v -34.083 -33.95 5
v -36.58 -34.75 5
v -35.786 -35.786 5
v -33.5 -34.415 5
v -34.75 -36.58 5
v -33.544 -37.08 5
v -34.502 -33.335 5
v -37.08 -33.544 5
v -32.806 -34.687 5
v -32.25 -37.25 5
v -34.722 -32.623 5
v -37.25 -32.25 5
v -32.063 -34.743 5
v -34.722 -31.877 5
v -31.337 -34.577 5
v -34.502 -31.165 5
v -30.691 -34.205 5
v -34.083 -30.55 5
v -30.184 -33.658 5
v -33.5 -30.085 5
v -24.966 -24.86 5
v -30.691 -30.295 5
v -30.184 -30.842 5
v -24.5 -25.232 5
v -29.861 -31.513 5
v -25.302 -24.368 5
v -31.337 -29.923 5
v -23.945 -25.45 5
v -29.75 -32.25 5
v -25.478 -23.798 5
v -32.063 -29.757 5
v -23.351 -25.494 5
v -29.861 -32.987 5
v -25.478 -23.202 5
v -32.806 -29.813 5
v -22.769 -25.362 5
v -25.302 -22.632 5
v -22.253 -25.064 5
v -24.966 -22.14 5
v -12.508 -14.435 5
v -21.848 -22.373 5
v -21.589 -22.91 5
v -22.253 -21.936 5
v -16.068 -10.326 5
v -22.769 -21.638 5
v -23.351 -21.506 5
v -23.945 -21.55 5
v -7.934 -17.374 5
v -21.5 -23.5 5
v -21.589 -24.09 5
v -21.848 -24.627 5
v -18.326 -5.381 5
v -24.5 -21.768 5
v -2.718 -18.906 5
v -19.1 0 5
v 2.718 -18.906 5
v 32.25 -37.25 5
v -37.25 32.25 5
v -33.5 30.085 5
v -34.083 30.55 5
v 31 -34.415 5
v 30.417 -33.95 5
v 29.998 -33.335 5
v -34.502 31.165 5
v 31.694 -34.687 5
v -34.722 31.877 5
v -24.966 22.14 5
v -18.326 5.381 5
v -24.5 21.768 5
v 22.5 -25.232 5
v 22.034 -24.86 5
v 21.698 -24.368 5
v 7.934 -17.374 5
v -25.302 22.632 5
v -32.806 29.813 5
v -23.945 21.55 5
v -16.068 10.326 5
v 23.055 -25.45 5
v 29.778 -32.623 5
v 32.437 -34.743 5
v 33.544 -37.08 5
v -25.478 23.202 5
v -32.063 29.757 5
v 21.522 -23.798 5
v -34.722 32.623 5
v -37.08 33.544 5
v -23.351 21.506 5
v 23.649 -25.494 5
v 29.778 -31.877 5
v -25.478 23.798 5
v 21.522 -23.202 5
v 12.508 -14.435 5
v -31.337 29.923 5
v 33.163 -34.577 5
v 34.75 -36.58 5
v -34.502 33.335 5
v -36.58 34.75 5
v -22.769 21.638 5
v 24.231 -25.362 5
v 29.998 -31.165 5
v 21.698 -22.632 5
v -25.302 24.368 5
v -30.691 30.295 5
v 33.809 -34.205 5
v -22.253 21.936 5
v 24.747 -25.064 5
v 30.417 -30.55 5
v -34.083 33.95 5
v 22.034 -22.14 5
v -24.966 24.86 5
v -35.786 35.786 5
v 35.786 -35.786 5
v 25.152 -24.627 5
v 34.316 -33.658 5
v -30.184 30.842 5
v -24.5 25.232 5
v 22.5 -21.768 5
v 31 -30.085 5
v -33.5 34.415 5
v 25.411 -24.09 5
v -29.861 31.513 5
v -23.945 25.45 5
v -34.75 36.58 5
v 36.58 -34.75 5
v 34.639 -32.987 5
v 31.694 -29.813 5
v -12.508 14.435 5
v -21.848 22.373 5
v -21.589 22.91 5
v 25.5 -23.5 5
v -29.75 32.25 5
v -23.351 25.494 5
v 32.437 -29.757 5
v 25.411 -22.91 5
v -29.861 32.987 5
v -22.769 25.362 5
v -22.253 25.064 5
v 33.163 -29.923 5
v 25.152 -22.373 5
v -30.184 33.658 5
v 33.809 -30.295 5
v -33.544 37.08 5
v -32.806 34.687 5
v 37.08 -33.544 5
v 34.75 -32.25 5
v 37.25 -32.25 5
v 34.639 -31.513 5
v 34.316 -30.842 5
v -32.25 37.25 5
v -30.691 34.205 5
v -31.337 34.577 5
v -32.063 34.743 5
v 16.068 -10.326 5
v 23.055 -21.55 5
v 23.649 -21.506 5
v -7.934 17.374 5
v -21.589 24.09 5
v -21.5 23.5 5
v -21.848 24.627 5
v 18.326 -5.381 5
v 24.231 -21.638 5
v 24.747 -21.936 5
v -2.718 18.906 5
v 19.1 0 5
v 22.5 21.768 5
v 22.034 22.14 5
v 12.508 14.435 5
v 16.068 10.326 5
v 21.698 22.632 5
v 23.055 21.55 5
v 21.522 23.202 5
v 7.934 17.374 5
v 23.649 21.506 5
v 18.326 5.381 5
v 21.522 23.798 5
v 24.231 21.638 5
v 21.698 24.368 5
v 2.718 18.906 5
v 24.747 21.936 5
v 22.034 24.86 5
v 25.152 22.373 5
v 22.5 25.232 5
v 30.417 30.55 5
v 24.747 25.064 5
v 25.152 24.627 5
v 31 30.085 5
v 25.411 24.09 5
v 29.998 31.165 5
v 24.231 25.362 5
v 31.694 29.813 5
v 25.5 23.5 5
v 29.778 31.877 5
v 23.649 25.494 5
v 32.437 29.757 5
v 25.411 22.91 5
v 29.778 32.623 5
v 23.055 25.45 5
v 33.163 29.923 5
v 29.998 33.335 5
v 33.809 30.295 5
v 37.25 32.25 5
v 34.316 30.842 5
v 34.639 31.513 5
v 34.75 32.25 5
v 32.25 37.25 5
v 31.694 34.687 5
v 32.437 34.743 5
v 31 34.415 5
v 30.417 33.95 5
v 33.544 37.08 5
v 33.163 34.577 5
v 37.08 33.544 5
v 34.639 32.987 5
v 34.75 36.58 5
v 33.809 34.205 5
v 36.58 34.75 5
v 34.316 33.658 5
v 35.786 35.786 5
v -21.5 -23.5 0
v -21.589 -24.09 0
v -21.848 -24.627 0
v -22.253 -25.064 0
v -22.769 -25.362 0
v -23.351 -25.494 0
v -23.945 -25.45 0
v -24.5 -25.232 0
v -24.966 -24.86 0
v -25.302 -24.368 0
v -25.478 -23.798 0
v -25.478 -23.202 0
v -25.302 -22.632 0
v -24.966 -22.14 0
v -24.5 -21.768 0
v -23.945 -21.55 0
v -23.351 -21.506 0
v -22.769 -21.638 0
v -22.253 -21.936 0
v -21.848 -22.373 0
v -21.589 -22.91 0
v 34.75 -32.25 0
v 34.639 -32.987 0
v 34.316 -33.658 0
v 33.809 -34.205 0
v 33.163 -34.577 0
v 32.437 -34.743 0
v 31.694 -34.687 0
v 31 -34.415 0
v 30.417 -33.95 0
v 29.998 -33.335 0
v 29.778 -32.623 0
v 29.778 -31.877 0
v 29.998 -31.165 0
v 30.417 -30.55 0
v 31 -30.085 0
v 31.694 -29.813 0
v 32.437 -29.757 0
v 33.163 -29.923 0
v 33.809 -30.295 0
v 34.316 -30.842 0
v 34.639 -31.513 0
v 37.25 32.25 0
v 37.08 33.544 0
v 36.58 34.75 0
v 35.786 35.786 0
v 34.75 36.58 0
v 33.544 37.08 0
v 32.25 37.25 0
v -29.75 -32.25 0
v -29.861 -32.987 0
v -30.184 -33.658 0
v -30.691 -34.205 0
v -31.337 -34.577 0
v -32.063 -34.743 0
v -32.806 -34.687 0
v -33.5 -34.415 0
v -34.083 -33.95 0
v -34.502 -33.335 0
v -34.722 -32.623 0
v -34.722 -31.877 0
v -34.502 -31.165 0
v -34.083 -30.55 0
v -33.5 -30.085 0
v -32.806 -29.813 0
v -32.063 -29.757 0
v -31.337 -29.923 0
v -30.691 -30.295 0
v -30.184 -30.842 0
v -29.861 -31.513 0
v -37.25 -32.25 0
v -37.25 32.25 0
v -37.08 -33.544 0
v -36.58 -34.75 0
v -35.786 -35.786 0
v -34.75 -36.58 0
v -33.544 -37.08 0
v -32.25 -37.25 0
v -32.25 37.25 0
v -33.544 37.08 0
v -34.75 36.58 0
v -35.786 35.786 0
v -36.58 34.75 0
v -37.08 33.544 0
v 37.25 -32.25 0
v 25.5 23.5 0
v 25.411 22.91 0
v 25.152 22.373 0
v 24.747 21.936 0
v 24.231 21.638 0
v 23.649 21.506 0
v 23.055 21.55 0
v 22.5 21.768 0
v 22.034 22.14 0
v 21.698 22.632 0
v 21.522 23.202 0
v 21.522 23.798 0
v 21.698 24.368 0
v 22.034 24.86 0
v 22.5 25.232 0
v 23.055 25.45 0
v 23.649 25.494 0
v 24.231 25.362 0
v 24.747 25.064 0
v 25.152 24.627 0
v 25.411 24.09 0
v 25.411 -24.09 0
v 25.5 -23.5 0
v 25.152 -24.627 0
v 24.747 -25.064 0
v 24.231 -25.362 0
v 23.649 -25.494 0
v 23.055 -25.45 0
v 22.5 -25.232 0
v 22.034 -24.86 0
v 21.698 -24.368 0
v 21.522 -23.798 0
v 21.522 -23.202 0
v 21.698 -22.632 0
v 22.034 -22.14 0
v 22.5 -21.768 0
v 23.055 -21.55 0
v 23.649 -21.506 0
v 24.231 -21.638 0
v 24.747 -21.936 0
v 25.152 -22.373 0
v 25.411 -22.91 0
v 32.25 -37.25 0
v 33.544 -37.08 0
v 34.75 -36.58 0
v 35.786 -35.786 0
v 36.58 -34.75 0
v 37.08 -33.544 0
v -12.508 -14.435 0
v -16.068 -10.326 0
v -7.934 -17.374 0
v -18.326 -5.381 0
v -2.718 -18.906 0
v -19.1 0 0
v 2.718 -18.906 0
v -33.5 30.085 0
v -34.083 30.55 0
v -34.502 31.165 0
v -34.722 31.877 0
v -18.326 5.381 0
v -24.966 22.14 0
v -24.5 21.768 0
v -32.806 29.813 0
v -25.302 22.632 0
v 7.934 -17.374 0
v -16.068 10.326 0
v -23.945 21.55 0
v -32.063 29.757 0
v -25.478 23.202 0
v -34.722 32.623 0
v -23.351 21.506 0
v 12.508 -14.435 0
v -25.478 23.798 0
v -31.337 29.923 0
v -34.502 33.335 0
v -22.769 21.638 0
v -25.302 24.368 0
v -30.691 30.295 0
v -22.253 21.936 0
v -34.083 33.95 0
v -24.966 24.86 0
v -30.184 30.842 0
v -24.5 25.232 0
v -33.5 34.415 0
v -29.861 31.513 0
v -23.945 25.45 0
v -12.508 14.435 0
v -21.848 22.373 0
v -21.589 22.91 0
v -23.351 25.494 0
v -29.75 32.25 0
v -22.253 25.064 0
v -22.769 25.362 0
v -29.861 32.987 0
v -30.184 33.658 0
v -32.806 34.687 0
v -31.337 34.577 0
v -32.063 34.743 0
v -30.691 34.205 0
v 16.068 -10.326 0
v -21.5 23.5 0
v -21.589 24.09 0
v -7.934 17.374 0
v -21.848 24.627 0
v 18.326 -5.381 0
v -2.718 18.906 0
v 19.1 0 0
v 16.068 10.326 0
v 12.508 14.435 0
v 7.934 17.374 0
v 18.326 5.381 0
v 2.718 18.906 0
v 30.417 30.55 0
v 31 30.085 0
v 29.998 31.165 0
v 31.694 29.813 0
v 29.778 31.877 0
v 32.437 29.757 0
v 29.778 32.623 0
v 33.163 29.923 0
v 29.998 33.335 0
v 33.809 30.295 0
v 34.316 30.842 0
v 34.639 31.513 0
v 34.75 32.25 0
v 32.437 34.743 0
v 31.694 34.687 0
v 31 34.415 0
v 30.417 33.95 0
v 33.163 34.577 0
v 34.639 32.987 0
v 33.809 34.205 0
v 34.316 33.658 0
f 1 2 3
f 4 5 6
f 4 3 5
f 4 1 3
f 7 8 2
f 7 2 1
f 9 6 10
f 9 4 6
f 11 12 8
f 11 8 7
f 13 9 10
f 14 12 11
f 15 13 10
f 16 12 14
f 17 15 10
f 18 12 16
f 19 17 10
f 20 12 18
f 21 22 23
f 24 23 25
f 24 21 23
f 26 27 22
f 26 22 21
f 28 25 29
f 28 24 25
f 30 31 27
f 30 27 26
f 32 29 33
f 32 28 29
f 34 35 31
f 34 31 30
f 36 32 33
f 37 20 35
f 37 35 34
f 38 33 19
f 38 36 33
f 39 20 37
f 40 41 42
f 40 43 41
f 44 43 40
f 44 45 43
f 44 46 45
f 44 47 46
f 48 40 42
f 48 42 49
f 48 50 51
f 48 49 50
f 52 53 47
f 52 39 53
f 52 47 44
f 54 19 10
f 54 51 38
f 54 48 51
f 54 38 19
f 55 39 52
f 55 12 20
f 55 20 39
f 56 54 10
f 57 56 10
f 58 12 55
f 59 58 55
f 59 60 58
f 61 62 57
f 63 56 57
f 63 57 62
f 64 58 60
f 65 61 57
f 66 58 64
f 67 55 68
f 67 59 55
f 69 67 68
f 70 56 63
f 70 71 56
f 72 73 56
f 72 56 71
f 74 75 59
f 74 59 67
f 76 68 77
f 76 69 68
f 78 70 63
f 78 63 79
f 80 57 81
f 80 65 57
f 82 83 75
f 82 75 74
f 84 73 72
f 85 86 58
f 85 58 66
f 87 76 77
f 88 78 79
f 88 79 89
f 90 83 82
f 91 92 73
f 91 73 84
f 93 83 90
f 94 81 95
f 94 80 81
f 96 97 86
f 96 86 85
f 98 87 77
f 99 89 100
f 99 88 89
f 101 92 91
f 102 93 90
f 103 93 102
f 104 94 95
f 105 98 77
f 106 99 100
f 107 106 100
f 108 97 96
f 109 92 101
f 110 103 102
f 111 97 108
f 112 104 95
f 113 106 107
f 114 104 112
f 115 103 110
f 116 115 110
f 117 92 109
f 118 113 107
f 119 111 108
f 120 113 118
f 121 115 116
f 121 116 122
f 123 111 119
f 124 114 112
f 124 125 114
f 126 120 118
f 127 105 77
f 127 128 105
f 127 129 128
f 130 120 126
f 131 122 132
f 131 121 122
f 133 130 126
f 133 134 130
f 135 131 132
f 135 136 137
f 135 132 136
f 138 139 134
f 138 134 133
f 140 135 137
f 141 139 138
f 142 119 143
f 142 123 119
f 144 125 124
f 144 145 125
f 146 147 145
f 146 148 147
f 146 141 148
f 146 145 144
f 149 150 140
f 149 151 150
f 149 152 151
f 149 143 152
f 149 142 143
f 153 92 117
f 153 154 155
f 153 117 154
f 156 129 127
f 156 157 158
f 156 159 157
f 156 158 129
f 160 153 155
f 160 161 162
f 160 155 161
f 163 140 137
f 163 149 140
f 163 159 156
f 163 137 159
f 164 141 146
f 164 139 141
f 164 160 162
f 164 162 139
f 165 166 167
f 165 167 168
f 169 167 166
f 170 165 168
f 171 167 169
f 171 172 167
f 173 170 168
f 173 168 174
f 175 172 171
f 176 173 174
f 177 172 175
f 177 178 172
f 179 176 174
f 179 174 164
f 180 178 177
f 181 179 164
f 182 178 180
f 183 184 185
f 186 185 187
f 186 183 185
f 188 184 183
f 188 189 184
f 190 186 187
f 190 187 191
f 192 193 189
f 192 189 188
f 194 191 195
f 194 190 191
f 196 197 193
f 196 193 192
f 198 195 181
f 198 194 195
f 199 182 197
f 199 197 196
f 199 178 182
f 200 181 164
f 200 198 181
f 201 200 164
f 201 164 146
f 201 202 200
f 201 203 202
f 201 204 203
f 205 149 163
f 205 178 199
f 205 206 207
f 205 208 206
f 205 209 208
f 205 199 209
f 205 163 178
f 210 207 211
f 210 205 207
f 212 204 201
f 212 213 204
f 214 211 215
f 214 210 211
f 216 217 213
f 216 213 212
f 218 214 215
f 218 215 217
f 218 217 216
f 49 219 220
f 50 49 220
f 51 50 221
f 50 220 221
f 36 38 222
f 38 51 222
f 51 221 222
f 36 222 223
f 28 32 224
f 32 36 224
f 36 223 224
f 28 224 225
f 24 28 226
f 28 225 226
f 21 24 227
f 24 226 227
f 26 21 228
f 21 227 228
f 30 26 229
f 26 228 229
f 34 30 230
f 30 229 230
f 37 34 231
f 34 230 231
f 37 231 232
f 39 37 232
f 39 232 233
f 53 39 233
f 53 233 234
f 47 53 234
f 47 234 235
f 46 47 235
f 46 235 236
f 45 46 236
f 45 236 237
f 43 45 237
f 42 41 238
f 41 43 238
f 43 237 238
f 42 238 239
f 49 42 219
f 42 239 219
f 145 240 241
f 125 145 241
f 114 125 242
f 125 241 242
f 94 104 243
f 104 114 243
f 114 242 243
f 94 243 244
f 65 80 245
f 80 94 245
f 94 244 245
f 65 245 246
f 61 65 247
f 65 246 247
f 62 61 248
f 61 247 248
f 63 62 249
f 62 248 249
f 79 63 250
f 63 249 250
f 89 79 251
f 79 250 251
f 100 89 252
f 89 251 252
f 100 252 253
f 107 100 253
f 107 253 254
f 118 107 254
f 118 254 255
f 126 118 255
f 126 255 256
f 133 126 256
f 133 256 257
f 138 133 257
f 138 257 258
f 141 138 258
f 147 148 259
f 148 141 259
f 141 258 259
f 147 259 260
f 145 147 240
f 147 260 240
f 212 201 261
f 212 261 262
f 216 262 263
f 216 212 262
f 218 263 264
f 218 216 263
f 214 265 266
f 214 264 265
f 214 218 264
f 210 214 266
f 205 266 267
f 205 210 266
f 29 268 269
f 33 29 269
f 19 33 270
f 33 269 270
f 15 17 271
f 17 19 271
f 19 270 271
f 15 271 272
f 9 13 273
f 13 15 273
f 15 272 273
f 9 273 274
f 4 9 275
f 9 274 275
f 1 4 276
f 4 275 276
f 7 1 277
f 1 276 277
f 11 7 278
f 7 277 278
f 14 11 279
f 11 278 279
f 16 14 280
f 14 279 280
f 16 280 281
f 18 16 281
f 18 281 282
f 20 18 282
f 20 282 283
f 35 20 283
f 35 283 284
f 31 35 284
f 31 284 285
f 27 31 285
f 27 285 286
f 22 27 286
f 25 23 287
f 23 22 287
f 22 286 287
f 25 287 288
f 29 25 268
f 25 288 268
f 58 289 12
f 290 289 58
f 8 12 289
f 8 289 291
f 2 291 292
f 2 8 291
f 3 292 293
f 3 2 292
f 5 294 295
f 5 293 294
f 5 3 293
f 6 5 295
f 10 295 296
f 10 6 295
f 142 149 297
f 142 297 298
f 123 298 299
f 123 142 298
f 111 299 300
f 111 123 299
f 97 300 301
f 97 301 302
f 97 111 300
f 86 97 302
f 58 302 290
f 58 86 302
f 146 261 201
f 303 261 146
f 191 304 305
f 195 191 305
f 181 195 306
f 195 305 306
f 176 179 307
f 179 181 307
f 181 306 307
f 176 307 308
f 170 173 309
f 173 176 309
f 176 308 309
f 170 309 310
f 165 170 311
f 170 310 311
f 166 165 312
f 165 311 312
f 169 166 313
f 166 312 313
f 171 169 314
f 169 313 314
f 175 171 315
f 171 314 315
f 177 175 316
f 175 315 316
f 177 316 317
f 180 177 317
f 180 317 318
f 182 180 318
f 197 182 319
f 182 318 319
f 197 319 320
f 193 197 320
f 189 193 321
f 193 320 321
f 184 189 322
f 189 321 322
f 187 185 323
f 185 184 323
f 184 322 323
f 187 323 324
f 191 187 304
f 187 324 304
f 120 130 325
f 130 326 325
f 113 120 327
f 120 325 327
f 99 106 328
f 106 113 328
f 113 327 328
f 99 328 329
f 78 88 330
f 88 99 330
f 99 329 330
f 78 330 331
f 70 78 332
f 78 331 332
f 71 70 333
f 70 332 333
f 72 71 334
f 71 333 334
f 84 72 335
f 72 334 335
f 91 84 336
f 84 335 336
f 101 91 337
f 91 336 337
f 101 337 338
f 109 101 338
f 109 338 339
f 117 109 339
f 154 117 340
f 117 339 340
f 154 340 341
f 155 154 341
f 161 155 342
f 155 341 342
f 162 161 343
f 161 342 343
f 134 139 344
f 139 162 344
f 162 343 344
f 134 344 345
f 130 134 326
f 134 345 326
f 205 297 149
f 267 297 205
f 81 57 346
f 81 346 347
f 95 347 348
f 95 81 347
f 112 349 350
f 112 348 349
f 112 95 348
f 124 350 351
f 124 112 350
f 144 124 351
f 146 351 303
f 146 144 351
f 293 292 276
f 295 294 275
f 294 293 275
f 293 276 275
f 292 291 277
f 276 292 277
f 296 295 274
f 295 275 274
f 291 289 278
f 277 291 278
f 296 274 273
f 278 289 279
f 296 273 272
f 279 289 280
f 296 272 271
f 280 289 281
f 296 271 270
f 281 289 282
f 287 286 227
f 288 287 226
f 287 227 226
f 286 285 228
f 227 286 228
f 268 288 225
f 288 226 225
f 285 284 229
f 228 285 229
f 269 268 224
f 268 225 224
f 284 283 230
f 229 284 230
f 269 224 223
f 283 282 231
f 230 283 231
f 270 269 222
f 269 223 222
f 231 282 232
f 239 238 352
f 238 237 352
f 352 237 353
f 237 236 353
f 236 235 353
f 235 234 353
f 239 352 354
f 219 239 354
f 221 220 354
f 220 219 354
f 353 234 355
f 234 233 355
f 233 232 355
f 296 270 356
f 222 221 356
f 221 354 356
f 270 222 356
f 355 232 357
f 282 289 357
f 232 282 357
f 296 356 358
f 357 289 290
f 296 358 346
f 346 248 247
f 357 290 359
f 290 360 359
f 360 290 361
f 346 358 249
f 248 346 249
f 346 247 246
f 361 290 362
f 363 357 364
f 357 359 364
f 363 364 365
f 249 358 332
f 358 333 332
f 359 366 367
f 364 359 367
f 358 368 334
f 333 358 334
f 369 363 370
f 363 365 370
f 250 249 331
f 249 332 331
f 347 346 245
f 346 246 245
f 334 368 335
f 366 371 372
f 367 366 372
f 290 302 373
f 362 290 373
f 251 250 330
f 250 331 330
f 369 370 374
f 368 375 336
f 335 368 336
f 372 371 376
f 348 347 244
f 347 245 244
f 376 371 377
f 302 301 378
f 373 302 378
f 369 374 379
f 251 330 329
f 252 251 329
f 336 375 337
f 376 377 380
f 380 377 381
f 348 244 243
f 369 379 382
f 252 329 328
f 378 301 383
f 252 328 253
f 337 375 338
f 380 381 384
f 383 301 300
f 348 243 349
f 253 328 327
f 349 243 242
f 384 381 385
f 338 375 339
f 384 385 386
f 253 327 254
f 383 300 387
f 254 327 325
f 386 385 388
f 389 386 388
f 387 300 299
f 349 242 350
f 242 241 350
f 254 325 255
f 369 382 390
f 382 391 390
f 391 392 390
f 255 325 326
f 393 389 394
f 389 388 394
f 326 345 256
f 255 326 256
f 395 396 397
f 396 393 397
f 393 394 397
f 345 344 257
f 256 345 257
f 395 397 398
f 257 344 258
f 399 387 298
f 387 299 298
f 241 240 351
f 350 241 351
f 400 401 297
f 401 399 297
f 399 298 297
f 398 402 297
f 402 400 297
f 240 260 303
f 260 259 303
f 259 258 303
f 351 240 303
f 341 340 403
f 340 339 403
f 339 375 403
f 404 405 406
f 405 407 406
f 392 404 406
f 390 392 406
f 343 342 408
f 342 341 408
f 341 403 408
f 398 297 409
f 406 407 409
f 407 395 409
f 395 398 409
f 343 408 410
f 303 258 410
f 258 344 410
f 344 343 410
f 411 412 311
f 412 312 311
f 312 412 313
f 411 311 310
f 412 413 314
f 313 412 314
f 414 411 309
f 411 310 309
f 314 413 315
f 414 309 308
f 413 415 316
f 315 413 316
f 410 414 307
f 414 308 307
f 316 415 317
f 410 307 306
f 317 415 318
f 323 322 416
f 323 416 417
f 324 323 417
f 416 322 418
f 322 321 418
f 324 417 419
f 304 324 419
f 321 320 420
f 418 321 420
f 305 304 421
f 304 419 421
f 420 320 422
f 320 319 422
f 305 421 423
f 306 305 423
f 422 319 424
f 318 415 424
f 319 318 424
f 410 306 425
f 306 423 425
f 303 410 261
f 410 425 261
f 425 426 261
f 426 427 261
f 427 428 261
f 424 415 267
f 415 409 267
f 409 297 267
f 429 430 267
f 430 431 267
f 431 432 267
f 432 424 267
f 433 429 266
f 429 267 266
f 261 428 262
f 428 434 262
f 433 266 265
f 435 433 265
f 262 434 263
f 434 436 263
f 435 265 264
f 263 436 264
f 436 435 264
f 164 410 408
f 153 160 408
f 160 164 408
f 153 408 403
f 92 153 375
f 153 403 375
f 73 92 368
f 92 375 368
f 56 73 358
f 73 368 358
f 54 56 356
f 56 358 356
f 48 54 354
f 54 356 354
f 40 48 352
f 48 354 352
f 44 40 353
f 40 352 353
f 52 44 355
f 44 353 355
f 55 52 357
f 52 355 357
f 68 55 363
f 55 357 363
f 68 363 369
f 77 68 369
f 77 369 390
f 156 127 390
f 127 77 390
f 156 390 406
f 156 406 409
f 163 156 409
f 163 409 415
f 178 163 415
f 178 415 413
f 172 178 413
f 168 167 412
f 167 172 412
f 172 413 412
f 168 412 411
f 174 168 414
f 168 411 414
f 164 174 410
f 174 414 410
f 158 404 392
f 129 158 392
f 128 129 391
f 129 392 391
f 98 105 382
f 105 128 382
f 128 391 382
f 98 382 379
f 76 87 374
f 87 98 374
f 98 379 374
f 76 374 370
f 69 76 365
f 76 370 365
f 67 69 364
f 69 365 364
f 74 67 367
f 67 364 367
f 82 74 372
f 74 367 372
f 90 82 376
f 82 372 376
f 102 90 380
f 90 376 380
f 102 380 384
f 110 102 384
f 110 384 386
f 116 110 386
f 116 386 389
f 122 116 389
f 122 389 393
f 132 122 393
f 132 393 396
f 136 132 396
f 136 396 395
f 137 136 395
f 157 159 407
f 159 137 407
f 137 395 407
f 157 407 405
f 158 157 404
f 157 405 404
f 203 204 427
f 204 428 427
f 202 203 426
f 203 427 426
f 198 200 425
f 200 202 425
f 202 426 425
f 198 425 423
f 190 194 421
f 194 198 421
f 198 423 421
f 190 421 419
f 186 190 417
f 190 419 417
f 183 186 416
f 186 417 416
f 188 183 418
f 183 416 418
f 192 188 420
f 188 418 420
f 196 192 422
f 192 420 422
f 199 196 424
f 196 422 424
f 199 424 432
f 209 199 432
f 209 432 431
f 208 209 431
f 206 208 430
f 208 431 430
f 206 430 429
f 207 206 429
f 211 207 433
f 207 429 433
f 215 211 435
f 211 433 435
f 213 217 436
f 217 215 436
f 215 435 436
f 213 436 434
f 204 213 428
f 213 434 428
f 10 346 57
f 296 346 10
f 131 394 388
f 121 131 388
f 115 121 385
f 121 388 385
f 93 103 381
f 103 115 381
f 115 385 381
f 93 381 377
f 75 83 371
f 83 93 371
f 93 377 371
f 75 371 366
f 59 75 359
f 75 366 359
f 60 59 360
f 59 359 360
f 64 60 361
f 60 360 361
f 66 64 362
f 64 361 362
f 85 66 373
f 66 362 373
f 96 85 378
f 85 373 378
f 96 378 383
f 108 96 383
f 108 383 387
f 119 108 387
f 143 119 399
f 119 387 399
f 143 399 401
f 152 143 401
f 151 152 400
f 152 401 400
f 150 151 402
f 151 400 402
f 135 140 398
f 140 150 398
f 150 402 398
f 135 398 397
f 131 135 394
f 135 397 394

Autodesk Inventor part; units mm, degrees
ref_plane "YZ Plane" through (0, 0, 0) normal (1, 0, 0) x (0, 1, 0)
ref_plane "XZ Plane" through (0, 0, 0) normal (0, 1, 0) x (-1, 0, 0)
ref_plane "XY Plane" through (0, 0, 0) normal (0, 0, 1) x (1, 0, 0)
sketch "Sketch1" plane through (0, 0, 0) normal (0, 0, 1) x (1, 0, 0)
  line L0 (-37.25, 37.25) -> (37.25, 37.25)
  line L1 (37.25, 37.25) -> (37.25, -37.25)
  line L2 (37.25, -37.25) -> (-37.25, -37.25)
  line L3 (-37.25, -37.25) -> (-37.25, 37.25)
  circle A0 centre (-23.5, 23.5) radius 2
  circle A1 centre (-23.5, -23.5) radius 2
  circle A2 centre (23.5, -23.5) radius 2
  circle A3 centre (23.5, 23.5) radius 2
  circle A4 centre (0, 0) radius 19.1
  circle A5 centre (-32.25, 32.25) radius 2.5
  circle A6 centre (32.25, 32.25) radius 2.5
  circle A7 centre (-32.25, -32.25) radius 2.5
  circle A8 centre (32.25, -32.25) radius 2.5
  dimension "d0" = 4
  dimension "d1" = 4
  dimension "d2" = 4
  dimension "d3" = 4
  dimension "d4" = 38.2
  dimension "d5" = 47
  dimension "d6" = 47
  dimension "d7" = 47
  dimension "d8" = 47
  dimension "d9" = 23.5
  dimension "d10" = 23.5
  dimension "d11" = 23.5
  dimension "d12" = 23.5
  dimension "d13" = 74.5
  dimension "d14" = 74.5
  dimension "d15" = 37.25
  dimension "d16" = 37.25
  dimension "d17" = 5
  dimension "d18" = 5
  dimension "d19" = 5
  dimension "d20" = 5
  dimension "d21" = 64.5
  dimension "d22" = 64.5
  dimension "d23" = 64.5
  dimension "d24" = 64.5
  dimension "d25" = 5
  dimension "d26" = 5
  dimension "d27" = 5
  dimension "d28" = 5
extrude "Extrusion1" add sketch "Sketch1" along normal blind 5
fillet "Fillet1" radius 5 4 edges at (37.25, 37.25, 2.5) (37.25, -37.25, 2.5) (-37.25, 37.25, 2.5) (-37.25, -37.25, 2.5)
properties part number "TurntableMotorBracket"
